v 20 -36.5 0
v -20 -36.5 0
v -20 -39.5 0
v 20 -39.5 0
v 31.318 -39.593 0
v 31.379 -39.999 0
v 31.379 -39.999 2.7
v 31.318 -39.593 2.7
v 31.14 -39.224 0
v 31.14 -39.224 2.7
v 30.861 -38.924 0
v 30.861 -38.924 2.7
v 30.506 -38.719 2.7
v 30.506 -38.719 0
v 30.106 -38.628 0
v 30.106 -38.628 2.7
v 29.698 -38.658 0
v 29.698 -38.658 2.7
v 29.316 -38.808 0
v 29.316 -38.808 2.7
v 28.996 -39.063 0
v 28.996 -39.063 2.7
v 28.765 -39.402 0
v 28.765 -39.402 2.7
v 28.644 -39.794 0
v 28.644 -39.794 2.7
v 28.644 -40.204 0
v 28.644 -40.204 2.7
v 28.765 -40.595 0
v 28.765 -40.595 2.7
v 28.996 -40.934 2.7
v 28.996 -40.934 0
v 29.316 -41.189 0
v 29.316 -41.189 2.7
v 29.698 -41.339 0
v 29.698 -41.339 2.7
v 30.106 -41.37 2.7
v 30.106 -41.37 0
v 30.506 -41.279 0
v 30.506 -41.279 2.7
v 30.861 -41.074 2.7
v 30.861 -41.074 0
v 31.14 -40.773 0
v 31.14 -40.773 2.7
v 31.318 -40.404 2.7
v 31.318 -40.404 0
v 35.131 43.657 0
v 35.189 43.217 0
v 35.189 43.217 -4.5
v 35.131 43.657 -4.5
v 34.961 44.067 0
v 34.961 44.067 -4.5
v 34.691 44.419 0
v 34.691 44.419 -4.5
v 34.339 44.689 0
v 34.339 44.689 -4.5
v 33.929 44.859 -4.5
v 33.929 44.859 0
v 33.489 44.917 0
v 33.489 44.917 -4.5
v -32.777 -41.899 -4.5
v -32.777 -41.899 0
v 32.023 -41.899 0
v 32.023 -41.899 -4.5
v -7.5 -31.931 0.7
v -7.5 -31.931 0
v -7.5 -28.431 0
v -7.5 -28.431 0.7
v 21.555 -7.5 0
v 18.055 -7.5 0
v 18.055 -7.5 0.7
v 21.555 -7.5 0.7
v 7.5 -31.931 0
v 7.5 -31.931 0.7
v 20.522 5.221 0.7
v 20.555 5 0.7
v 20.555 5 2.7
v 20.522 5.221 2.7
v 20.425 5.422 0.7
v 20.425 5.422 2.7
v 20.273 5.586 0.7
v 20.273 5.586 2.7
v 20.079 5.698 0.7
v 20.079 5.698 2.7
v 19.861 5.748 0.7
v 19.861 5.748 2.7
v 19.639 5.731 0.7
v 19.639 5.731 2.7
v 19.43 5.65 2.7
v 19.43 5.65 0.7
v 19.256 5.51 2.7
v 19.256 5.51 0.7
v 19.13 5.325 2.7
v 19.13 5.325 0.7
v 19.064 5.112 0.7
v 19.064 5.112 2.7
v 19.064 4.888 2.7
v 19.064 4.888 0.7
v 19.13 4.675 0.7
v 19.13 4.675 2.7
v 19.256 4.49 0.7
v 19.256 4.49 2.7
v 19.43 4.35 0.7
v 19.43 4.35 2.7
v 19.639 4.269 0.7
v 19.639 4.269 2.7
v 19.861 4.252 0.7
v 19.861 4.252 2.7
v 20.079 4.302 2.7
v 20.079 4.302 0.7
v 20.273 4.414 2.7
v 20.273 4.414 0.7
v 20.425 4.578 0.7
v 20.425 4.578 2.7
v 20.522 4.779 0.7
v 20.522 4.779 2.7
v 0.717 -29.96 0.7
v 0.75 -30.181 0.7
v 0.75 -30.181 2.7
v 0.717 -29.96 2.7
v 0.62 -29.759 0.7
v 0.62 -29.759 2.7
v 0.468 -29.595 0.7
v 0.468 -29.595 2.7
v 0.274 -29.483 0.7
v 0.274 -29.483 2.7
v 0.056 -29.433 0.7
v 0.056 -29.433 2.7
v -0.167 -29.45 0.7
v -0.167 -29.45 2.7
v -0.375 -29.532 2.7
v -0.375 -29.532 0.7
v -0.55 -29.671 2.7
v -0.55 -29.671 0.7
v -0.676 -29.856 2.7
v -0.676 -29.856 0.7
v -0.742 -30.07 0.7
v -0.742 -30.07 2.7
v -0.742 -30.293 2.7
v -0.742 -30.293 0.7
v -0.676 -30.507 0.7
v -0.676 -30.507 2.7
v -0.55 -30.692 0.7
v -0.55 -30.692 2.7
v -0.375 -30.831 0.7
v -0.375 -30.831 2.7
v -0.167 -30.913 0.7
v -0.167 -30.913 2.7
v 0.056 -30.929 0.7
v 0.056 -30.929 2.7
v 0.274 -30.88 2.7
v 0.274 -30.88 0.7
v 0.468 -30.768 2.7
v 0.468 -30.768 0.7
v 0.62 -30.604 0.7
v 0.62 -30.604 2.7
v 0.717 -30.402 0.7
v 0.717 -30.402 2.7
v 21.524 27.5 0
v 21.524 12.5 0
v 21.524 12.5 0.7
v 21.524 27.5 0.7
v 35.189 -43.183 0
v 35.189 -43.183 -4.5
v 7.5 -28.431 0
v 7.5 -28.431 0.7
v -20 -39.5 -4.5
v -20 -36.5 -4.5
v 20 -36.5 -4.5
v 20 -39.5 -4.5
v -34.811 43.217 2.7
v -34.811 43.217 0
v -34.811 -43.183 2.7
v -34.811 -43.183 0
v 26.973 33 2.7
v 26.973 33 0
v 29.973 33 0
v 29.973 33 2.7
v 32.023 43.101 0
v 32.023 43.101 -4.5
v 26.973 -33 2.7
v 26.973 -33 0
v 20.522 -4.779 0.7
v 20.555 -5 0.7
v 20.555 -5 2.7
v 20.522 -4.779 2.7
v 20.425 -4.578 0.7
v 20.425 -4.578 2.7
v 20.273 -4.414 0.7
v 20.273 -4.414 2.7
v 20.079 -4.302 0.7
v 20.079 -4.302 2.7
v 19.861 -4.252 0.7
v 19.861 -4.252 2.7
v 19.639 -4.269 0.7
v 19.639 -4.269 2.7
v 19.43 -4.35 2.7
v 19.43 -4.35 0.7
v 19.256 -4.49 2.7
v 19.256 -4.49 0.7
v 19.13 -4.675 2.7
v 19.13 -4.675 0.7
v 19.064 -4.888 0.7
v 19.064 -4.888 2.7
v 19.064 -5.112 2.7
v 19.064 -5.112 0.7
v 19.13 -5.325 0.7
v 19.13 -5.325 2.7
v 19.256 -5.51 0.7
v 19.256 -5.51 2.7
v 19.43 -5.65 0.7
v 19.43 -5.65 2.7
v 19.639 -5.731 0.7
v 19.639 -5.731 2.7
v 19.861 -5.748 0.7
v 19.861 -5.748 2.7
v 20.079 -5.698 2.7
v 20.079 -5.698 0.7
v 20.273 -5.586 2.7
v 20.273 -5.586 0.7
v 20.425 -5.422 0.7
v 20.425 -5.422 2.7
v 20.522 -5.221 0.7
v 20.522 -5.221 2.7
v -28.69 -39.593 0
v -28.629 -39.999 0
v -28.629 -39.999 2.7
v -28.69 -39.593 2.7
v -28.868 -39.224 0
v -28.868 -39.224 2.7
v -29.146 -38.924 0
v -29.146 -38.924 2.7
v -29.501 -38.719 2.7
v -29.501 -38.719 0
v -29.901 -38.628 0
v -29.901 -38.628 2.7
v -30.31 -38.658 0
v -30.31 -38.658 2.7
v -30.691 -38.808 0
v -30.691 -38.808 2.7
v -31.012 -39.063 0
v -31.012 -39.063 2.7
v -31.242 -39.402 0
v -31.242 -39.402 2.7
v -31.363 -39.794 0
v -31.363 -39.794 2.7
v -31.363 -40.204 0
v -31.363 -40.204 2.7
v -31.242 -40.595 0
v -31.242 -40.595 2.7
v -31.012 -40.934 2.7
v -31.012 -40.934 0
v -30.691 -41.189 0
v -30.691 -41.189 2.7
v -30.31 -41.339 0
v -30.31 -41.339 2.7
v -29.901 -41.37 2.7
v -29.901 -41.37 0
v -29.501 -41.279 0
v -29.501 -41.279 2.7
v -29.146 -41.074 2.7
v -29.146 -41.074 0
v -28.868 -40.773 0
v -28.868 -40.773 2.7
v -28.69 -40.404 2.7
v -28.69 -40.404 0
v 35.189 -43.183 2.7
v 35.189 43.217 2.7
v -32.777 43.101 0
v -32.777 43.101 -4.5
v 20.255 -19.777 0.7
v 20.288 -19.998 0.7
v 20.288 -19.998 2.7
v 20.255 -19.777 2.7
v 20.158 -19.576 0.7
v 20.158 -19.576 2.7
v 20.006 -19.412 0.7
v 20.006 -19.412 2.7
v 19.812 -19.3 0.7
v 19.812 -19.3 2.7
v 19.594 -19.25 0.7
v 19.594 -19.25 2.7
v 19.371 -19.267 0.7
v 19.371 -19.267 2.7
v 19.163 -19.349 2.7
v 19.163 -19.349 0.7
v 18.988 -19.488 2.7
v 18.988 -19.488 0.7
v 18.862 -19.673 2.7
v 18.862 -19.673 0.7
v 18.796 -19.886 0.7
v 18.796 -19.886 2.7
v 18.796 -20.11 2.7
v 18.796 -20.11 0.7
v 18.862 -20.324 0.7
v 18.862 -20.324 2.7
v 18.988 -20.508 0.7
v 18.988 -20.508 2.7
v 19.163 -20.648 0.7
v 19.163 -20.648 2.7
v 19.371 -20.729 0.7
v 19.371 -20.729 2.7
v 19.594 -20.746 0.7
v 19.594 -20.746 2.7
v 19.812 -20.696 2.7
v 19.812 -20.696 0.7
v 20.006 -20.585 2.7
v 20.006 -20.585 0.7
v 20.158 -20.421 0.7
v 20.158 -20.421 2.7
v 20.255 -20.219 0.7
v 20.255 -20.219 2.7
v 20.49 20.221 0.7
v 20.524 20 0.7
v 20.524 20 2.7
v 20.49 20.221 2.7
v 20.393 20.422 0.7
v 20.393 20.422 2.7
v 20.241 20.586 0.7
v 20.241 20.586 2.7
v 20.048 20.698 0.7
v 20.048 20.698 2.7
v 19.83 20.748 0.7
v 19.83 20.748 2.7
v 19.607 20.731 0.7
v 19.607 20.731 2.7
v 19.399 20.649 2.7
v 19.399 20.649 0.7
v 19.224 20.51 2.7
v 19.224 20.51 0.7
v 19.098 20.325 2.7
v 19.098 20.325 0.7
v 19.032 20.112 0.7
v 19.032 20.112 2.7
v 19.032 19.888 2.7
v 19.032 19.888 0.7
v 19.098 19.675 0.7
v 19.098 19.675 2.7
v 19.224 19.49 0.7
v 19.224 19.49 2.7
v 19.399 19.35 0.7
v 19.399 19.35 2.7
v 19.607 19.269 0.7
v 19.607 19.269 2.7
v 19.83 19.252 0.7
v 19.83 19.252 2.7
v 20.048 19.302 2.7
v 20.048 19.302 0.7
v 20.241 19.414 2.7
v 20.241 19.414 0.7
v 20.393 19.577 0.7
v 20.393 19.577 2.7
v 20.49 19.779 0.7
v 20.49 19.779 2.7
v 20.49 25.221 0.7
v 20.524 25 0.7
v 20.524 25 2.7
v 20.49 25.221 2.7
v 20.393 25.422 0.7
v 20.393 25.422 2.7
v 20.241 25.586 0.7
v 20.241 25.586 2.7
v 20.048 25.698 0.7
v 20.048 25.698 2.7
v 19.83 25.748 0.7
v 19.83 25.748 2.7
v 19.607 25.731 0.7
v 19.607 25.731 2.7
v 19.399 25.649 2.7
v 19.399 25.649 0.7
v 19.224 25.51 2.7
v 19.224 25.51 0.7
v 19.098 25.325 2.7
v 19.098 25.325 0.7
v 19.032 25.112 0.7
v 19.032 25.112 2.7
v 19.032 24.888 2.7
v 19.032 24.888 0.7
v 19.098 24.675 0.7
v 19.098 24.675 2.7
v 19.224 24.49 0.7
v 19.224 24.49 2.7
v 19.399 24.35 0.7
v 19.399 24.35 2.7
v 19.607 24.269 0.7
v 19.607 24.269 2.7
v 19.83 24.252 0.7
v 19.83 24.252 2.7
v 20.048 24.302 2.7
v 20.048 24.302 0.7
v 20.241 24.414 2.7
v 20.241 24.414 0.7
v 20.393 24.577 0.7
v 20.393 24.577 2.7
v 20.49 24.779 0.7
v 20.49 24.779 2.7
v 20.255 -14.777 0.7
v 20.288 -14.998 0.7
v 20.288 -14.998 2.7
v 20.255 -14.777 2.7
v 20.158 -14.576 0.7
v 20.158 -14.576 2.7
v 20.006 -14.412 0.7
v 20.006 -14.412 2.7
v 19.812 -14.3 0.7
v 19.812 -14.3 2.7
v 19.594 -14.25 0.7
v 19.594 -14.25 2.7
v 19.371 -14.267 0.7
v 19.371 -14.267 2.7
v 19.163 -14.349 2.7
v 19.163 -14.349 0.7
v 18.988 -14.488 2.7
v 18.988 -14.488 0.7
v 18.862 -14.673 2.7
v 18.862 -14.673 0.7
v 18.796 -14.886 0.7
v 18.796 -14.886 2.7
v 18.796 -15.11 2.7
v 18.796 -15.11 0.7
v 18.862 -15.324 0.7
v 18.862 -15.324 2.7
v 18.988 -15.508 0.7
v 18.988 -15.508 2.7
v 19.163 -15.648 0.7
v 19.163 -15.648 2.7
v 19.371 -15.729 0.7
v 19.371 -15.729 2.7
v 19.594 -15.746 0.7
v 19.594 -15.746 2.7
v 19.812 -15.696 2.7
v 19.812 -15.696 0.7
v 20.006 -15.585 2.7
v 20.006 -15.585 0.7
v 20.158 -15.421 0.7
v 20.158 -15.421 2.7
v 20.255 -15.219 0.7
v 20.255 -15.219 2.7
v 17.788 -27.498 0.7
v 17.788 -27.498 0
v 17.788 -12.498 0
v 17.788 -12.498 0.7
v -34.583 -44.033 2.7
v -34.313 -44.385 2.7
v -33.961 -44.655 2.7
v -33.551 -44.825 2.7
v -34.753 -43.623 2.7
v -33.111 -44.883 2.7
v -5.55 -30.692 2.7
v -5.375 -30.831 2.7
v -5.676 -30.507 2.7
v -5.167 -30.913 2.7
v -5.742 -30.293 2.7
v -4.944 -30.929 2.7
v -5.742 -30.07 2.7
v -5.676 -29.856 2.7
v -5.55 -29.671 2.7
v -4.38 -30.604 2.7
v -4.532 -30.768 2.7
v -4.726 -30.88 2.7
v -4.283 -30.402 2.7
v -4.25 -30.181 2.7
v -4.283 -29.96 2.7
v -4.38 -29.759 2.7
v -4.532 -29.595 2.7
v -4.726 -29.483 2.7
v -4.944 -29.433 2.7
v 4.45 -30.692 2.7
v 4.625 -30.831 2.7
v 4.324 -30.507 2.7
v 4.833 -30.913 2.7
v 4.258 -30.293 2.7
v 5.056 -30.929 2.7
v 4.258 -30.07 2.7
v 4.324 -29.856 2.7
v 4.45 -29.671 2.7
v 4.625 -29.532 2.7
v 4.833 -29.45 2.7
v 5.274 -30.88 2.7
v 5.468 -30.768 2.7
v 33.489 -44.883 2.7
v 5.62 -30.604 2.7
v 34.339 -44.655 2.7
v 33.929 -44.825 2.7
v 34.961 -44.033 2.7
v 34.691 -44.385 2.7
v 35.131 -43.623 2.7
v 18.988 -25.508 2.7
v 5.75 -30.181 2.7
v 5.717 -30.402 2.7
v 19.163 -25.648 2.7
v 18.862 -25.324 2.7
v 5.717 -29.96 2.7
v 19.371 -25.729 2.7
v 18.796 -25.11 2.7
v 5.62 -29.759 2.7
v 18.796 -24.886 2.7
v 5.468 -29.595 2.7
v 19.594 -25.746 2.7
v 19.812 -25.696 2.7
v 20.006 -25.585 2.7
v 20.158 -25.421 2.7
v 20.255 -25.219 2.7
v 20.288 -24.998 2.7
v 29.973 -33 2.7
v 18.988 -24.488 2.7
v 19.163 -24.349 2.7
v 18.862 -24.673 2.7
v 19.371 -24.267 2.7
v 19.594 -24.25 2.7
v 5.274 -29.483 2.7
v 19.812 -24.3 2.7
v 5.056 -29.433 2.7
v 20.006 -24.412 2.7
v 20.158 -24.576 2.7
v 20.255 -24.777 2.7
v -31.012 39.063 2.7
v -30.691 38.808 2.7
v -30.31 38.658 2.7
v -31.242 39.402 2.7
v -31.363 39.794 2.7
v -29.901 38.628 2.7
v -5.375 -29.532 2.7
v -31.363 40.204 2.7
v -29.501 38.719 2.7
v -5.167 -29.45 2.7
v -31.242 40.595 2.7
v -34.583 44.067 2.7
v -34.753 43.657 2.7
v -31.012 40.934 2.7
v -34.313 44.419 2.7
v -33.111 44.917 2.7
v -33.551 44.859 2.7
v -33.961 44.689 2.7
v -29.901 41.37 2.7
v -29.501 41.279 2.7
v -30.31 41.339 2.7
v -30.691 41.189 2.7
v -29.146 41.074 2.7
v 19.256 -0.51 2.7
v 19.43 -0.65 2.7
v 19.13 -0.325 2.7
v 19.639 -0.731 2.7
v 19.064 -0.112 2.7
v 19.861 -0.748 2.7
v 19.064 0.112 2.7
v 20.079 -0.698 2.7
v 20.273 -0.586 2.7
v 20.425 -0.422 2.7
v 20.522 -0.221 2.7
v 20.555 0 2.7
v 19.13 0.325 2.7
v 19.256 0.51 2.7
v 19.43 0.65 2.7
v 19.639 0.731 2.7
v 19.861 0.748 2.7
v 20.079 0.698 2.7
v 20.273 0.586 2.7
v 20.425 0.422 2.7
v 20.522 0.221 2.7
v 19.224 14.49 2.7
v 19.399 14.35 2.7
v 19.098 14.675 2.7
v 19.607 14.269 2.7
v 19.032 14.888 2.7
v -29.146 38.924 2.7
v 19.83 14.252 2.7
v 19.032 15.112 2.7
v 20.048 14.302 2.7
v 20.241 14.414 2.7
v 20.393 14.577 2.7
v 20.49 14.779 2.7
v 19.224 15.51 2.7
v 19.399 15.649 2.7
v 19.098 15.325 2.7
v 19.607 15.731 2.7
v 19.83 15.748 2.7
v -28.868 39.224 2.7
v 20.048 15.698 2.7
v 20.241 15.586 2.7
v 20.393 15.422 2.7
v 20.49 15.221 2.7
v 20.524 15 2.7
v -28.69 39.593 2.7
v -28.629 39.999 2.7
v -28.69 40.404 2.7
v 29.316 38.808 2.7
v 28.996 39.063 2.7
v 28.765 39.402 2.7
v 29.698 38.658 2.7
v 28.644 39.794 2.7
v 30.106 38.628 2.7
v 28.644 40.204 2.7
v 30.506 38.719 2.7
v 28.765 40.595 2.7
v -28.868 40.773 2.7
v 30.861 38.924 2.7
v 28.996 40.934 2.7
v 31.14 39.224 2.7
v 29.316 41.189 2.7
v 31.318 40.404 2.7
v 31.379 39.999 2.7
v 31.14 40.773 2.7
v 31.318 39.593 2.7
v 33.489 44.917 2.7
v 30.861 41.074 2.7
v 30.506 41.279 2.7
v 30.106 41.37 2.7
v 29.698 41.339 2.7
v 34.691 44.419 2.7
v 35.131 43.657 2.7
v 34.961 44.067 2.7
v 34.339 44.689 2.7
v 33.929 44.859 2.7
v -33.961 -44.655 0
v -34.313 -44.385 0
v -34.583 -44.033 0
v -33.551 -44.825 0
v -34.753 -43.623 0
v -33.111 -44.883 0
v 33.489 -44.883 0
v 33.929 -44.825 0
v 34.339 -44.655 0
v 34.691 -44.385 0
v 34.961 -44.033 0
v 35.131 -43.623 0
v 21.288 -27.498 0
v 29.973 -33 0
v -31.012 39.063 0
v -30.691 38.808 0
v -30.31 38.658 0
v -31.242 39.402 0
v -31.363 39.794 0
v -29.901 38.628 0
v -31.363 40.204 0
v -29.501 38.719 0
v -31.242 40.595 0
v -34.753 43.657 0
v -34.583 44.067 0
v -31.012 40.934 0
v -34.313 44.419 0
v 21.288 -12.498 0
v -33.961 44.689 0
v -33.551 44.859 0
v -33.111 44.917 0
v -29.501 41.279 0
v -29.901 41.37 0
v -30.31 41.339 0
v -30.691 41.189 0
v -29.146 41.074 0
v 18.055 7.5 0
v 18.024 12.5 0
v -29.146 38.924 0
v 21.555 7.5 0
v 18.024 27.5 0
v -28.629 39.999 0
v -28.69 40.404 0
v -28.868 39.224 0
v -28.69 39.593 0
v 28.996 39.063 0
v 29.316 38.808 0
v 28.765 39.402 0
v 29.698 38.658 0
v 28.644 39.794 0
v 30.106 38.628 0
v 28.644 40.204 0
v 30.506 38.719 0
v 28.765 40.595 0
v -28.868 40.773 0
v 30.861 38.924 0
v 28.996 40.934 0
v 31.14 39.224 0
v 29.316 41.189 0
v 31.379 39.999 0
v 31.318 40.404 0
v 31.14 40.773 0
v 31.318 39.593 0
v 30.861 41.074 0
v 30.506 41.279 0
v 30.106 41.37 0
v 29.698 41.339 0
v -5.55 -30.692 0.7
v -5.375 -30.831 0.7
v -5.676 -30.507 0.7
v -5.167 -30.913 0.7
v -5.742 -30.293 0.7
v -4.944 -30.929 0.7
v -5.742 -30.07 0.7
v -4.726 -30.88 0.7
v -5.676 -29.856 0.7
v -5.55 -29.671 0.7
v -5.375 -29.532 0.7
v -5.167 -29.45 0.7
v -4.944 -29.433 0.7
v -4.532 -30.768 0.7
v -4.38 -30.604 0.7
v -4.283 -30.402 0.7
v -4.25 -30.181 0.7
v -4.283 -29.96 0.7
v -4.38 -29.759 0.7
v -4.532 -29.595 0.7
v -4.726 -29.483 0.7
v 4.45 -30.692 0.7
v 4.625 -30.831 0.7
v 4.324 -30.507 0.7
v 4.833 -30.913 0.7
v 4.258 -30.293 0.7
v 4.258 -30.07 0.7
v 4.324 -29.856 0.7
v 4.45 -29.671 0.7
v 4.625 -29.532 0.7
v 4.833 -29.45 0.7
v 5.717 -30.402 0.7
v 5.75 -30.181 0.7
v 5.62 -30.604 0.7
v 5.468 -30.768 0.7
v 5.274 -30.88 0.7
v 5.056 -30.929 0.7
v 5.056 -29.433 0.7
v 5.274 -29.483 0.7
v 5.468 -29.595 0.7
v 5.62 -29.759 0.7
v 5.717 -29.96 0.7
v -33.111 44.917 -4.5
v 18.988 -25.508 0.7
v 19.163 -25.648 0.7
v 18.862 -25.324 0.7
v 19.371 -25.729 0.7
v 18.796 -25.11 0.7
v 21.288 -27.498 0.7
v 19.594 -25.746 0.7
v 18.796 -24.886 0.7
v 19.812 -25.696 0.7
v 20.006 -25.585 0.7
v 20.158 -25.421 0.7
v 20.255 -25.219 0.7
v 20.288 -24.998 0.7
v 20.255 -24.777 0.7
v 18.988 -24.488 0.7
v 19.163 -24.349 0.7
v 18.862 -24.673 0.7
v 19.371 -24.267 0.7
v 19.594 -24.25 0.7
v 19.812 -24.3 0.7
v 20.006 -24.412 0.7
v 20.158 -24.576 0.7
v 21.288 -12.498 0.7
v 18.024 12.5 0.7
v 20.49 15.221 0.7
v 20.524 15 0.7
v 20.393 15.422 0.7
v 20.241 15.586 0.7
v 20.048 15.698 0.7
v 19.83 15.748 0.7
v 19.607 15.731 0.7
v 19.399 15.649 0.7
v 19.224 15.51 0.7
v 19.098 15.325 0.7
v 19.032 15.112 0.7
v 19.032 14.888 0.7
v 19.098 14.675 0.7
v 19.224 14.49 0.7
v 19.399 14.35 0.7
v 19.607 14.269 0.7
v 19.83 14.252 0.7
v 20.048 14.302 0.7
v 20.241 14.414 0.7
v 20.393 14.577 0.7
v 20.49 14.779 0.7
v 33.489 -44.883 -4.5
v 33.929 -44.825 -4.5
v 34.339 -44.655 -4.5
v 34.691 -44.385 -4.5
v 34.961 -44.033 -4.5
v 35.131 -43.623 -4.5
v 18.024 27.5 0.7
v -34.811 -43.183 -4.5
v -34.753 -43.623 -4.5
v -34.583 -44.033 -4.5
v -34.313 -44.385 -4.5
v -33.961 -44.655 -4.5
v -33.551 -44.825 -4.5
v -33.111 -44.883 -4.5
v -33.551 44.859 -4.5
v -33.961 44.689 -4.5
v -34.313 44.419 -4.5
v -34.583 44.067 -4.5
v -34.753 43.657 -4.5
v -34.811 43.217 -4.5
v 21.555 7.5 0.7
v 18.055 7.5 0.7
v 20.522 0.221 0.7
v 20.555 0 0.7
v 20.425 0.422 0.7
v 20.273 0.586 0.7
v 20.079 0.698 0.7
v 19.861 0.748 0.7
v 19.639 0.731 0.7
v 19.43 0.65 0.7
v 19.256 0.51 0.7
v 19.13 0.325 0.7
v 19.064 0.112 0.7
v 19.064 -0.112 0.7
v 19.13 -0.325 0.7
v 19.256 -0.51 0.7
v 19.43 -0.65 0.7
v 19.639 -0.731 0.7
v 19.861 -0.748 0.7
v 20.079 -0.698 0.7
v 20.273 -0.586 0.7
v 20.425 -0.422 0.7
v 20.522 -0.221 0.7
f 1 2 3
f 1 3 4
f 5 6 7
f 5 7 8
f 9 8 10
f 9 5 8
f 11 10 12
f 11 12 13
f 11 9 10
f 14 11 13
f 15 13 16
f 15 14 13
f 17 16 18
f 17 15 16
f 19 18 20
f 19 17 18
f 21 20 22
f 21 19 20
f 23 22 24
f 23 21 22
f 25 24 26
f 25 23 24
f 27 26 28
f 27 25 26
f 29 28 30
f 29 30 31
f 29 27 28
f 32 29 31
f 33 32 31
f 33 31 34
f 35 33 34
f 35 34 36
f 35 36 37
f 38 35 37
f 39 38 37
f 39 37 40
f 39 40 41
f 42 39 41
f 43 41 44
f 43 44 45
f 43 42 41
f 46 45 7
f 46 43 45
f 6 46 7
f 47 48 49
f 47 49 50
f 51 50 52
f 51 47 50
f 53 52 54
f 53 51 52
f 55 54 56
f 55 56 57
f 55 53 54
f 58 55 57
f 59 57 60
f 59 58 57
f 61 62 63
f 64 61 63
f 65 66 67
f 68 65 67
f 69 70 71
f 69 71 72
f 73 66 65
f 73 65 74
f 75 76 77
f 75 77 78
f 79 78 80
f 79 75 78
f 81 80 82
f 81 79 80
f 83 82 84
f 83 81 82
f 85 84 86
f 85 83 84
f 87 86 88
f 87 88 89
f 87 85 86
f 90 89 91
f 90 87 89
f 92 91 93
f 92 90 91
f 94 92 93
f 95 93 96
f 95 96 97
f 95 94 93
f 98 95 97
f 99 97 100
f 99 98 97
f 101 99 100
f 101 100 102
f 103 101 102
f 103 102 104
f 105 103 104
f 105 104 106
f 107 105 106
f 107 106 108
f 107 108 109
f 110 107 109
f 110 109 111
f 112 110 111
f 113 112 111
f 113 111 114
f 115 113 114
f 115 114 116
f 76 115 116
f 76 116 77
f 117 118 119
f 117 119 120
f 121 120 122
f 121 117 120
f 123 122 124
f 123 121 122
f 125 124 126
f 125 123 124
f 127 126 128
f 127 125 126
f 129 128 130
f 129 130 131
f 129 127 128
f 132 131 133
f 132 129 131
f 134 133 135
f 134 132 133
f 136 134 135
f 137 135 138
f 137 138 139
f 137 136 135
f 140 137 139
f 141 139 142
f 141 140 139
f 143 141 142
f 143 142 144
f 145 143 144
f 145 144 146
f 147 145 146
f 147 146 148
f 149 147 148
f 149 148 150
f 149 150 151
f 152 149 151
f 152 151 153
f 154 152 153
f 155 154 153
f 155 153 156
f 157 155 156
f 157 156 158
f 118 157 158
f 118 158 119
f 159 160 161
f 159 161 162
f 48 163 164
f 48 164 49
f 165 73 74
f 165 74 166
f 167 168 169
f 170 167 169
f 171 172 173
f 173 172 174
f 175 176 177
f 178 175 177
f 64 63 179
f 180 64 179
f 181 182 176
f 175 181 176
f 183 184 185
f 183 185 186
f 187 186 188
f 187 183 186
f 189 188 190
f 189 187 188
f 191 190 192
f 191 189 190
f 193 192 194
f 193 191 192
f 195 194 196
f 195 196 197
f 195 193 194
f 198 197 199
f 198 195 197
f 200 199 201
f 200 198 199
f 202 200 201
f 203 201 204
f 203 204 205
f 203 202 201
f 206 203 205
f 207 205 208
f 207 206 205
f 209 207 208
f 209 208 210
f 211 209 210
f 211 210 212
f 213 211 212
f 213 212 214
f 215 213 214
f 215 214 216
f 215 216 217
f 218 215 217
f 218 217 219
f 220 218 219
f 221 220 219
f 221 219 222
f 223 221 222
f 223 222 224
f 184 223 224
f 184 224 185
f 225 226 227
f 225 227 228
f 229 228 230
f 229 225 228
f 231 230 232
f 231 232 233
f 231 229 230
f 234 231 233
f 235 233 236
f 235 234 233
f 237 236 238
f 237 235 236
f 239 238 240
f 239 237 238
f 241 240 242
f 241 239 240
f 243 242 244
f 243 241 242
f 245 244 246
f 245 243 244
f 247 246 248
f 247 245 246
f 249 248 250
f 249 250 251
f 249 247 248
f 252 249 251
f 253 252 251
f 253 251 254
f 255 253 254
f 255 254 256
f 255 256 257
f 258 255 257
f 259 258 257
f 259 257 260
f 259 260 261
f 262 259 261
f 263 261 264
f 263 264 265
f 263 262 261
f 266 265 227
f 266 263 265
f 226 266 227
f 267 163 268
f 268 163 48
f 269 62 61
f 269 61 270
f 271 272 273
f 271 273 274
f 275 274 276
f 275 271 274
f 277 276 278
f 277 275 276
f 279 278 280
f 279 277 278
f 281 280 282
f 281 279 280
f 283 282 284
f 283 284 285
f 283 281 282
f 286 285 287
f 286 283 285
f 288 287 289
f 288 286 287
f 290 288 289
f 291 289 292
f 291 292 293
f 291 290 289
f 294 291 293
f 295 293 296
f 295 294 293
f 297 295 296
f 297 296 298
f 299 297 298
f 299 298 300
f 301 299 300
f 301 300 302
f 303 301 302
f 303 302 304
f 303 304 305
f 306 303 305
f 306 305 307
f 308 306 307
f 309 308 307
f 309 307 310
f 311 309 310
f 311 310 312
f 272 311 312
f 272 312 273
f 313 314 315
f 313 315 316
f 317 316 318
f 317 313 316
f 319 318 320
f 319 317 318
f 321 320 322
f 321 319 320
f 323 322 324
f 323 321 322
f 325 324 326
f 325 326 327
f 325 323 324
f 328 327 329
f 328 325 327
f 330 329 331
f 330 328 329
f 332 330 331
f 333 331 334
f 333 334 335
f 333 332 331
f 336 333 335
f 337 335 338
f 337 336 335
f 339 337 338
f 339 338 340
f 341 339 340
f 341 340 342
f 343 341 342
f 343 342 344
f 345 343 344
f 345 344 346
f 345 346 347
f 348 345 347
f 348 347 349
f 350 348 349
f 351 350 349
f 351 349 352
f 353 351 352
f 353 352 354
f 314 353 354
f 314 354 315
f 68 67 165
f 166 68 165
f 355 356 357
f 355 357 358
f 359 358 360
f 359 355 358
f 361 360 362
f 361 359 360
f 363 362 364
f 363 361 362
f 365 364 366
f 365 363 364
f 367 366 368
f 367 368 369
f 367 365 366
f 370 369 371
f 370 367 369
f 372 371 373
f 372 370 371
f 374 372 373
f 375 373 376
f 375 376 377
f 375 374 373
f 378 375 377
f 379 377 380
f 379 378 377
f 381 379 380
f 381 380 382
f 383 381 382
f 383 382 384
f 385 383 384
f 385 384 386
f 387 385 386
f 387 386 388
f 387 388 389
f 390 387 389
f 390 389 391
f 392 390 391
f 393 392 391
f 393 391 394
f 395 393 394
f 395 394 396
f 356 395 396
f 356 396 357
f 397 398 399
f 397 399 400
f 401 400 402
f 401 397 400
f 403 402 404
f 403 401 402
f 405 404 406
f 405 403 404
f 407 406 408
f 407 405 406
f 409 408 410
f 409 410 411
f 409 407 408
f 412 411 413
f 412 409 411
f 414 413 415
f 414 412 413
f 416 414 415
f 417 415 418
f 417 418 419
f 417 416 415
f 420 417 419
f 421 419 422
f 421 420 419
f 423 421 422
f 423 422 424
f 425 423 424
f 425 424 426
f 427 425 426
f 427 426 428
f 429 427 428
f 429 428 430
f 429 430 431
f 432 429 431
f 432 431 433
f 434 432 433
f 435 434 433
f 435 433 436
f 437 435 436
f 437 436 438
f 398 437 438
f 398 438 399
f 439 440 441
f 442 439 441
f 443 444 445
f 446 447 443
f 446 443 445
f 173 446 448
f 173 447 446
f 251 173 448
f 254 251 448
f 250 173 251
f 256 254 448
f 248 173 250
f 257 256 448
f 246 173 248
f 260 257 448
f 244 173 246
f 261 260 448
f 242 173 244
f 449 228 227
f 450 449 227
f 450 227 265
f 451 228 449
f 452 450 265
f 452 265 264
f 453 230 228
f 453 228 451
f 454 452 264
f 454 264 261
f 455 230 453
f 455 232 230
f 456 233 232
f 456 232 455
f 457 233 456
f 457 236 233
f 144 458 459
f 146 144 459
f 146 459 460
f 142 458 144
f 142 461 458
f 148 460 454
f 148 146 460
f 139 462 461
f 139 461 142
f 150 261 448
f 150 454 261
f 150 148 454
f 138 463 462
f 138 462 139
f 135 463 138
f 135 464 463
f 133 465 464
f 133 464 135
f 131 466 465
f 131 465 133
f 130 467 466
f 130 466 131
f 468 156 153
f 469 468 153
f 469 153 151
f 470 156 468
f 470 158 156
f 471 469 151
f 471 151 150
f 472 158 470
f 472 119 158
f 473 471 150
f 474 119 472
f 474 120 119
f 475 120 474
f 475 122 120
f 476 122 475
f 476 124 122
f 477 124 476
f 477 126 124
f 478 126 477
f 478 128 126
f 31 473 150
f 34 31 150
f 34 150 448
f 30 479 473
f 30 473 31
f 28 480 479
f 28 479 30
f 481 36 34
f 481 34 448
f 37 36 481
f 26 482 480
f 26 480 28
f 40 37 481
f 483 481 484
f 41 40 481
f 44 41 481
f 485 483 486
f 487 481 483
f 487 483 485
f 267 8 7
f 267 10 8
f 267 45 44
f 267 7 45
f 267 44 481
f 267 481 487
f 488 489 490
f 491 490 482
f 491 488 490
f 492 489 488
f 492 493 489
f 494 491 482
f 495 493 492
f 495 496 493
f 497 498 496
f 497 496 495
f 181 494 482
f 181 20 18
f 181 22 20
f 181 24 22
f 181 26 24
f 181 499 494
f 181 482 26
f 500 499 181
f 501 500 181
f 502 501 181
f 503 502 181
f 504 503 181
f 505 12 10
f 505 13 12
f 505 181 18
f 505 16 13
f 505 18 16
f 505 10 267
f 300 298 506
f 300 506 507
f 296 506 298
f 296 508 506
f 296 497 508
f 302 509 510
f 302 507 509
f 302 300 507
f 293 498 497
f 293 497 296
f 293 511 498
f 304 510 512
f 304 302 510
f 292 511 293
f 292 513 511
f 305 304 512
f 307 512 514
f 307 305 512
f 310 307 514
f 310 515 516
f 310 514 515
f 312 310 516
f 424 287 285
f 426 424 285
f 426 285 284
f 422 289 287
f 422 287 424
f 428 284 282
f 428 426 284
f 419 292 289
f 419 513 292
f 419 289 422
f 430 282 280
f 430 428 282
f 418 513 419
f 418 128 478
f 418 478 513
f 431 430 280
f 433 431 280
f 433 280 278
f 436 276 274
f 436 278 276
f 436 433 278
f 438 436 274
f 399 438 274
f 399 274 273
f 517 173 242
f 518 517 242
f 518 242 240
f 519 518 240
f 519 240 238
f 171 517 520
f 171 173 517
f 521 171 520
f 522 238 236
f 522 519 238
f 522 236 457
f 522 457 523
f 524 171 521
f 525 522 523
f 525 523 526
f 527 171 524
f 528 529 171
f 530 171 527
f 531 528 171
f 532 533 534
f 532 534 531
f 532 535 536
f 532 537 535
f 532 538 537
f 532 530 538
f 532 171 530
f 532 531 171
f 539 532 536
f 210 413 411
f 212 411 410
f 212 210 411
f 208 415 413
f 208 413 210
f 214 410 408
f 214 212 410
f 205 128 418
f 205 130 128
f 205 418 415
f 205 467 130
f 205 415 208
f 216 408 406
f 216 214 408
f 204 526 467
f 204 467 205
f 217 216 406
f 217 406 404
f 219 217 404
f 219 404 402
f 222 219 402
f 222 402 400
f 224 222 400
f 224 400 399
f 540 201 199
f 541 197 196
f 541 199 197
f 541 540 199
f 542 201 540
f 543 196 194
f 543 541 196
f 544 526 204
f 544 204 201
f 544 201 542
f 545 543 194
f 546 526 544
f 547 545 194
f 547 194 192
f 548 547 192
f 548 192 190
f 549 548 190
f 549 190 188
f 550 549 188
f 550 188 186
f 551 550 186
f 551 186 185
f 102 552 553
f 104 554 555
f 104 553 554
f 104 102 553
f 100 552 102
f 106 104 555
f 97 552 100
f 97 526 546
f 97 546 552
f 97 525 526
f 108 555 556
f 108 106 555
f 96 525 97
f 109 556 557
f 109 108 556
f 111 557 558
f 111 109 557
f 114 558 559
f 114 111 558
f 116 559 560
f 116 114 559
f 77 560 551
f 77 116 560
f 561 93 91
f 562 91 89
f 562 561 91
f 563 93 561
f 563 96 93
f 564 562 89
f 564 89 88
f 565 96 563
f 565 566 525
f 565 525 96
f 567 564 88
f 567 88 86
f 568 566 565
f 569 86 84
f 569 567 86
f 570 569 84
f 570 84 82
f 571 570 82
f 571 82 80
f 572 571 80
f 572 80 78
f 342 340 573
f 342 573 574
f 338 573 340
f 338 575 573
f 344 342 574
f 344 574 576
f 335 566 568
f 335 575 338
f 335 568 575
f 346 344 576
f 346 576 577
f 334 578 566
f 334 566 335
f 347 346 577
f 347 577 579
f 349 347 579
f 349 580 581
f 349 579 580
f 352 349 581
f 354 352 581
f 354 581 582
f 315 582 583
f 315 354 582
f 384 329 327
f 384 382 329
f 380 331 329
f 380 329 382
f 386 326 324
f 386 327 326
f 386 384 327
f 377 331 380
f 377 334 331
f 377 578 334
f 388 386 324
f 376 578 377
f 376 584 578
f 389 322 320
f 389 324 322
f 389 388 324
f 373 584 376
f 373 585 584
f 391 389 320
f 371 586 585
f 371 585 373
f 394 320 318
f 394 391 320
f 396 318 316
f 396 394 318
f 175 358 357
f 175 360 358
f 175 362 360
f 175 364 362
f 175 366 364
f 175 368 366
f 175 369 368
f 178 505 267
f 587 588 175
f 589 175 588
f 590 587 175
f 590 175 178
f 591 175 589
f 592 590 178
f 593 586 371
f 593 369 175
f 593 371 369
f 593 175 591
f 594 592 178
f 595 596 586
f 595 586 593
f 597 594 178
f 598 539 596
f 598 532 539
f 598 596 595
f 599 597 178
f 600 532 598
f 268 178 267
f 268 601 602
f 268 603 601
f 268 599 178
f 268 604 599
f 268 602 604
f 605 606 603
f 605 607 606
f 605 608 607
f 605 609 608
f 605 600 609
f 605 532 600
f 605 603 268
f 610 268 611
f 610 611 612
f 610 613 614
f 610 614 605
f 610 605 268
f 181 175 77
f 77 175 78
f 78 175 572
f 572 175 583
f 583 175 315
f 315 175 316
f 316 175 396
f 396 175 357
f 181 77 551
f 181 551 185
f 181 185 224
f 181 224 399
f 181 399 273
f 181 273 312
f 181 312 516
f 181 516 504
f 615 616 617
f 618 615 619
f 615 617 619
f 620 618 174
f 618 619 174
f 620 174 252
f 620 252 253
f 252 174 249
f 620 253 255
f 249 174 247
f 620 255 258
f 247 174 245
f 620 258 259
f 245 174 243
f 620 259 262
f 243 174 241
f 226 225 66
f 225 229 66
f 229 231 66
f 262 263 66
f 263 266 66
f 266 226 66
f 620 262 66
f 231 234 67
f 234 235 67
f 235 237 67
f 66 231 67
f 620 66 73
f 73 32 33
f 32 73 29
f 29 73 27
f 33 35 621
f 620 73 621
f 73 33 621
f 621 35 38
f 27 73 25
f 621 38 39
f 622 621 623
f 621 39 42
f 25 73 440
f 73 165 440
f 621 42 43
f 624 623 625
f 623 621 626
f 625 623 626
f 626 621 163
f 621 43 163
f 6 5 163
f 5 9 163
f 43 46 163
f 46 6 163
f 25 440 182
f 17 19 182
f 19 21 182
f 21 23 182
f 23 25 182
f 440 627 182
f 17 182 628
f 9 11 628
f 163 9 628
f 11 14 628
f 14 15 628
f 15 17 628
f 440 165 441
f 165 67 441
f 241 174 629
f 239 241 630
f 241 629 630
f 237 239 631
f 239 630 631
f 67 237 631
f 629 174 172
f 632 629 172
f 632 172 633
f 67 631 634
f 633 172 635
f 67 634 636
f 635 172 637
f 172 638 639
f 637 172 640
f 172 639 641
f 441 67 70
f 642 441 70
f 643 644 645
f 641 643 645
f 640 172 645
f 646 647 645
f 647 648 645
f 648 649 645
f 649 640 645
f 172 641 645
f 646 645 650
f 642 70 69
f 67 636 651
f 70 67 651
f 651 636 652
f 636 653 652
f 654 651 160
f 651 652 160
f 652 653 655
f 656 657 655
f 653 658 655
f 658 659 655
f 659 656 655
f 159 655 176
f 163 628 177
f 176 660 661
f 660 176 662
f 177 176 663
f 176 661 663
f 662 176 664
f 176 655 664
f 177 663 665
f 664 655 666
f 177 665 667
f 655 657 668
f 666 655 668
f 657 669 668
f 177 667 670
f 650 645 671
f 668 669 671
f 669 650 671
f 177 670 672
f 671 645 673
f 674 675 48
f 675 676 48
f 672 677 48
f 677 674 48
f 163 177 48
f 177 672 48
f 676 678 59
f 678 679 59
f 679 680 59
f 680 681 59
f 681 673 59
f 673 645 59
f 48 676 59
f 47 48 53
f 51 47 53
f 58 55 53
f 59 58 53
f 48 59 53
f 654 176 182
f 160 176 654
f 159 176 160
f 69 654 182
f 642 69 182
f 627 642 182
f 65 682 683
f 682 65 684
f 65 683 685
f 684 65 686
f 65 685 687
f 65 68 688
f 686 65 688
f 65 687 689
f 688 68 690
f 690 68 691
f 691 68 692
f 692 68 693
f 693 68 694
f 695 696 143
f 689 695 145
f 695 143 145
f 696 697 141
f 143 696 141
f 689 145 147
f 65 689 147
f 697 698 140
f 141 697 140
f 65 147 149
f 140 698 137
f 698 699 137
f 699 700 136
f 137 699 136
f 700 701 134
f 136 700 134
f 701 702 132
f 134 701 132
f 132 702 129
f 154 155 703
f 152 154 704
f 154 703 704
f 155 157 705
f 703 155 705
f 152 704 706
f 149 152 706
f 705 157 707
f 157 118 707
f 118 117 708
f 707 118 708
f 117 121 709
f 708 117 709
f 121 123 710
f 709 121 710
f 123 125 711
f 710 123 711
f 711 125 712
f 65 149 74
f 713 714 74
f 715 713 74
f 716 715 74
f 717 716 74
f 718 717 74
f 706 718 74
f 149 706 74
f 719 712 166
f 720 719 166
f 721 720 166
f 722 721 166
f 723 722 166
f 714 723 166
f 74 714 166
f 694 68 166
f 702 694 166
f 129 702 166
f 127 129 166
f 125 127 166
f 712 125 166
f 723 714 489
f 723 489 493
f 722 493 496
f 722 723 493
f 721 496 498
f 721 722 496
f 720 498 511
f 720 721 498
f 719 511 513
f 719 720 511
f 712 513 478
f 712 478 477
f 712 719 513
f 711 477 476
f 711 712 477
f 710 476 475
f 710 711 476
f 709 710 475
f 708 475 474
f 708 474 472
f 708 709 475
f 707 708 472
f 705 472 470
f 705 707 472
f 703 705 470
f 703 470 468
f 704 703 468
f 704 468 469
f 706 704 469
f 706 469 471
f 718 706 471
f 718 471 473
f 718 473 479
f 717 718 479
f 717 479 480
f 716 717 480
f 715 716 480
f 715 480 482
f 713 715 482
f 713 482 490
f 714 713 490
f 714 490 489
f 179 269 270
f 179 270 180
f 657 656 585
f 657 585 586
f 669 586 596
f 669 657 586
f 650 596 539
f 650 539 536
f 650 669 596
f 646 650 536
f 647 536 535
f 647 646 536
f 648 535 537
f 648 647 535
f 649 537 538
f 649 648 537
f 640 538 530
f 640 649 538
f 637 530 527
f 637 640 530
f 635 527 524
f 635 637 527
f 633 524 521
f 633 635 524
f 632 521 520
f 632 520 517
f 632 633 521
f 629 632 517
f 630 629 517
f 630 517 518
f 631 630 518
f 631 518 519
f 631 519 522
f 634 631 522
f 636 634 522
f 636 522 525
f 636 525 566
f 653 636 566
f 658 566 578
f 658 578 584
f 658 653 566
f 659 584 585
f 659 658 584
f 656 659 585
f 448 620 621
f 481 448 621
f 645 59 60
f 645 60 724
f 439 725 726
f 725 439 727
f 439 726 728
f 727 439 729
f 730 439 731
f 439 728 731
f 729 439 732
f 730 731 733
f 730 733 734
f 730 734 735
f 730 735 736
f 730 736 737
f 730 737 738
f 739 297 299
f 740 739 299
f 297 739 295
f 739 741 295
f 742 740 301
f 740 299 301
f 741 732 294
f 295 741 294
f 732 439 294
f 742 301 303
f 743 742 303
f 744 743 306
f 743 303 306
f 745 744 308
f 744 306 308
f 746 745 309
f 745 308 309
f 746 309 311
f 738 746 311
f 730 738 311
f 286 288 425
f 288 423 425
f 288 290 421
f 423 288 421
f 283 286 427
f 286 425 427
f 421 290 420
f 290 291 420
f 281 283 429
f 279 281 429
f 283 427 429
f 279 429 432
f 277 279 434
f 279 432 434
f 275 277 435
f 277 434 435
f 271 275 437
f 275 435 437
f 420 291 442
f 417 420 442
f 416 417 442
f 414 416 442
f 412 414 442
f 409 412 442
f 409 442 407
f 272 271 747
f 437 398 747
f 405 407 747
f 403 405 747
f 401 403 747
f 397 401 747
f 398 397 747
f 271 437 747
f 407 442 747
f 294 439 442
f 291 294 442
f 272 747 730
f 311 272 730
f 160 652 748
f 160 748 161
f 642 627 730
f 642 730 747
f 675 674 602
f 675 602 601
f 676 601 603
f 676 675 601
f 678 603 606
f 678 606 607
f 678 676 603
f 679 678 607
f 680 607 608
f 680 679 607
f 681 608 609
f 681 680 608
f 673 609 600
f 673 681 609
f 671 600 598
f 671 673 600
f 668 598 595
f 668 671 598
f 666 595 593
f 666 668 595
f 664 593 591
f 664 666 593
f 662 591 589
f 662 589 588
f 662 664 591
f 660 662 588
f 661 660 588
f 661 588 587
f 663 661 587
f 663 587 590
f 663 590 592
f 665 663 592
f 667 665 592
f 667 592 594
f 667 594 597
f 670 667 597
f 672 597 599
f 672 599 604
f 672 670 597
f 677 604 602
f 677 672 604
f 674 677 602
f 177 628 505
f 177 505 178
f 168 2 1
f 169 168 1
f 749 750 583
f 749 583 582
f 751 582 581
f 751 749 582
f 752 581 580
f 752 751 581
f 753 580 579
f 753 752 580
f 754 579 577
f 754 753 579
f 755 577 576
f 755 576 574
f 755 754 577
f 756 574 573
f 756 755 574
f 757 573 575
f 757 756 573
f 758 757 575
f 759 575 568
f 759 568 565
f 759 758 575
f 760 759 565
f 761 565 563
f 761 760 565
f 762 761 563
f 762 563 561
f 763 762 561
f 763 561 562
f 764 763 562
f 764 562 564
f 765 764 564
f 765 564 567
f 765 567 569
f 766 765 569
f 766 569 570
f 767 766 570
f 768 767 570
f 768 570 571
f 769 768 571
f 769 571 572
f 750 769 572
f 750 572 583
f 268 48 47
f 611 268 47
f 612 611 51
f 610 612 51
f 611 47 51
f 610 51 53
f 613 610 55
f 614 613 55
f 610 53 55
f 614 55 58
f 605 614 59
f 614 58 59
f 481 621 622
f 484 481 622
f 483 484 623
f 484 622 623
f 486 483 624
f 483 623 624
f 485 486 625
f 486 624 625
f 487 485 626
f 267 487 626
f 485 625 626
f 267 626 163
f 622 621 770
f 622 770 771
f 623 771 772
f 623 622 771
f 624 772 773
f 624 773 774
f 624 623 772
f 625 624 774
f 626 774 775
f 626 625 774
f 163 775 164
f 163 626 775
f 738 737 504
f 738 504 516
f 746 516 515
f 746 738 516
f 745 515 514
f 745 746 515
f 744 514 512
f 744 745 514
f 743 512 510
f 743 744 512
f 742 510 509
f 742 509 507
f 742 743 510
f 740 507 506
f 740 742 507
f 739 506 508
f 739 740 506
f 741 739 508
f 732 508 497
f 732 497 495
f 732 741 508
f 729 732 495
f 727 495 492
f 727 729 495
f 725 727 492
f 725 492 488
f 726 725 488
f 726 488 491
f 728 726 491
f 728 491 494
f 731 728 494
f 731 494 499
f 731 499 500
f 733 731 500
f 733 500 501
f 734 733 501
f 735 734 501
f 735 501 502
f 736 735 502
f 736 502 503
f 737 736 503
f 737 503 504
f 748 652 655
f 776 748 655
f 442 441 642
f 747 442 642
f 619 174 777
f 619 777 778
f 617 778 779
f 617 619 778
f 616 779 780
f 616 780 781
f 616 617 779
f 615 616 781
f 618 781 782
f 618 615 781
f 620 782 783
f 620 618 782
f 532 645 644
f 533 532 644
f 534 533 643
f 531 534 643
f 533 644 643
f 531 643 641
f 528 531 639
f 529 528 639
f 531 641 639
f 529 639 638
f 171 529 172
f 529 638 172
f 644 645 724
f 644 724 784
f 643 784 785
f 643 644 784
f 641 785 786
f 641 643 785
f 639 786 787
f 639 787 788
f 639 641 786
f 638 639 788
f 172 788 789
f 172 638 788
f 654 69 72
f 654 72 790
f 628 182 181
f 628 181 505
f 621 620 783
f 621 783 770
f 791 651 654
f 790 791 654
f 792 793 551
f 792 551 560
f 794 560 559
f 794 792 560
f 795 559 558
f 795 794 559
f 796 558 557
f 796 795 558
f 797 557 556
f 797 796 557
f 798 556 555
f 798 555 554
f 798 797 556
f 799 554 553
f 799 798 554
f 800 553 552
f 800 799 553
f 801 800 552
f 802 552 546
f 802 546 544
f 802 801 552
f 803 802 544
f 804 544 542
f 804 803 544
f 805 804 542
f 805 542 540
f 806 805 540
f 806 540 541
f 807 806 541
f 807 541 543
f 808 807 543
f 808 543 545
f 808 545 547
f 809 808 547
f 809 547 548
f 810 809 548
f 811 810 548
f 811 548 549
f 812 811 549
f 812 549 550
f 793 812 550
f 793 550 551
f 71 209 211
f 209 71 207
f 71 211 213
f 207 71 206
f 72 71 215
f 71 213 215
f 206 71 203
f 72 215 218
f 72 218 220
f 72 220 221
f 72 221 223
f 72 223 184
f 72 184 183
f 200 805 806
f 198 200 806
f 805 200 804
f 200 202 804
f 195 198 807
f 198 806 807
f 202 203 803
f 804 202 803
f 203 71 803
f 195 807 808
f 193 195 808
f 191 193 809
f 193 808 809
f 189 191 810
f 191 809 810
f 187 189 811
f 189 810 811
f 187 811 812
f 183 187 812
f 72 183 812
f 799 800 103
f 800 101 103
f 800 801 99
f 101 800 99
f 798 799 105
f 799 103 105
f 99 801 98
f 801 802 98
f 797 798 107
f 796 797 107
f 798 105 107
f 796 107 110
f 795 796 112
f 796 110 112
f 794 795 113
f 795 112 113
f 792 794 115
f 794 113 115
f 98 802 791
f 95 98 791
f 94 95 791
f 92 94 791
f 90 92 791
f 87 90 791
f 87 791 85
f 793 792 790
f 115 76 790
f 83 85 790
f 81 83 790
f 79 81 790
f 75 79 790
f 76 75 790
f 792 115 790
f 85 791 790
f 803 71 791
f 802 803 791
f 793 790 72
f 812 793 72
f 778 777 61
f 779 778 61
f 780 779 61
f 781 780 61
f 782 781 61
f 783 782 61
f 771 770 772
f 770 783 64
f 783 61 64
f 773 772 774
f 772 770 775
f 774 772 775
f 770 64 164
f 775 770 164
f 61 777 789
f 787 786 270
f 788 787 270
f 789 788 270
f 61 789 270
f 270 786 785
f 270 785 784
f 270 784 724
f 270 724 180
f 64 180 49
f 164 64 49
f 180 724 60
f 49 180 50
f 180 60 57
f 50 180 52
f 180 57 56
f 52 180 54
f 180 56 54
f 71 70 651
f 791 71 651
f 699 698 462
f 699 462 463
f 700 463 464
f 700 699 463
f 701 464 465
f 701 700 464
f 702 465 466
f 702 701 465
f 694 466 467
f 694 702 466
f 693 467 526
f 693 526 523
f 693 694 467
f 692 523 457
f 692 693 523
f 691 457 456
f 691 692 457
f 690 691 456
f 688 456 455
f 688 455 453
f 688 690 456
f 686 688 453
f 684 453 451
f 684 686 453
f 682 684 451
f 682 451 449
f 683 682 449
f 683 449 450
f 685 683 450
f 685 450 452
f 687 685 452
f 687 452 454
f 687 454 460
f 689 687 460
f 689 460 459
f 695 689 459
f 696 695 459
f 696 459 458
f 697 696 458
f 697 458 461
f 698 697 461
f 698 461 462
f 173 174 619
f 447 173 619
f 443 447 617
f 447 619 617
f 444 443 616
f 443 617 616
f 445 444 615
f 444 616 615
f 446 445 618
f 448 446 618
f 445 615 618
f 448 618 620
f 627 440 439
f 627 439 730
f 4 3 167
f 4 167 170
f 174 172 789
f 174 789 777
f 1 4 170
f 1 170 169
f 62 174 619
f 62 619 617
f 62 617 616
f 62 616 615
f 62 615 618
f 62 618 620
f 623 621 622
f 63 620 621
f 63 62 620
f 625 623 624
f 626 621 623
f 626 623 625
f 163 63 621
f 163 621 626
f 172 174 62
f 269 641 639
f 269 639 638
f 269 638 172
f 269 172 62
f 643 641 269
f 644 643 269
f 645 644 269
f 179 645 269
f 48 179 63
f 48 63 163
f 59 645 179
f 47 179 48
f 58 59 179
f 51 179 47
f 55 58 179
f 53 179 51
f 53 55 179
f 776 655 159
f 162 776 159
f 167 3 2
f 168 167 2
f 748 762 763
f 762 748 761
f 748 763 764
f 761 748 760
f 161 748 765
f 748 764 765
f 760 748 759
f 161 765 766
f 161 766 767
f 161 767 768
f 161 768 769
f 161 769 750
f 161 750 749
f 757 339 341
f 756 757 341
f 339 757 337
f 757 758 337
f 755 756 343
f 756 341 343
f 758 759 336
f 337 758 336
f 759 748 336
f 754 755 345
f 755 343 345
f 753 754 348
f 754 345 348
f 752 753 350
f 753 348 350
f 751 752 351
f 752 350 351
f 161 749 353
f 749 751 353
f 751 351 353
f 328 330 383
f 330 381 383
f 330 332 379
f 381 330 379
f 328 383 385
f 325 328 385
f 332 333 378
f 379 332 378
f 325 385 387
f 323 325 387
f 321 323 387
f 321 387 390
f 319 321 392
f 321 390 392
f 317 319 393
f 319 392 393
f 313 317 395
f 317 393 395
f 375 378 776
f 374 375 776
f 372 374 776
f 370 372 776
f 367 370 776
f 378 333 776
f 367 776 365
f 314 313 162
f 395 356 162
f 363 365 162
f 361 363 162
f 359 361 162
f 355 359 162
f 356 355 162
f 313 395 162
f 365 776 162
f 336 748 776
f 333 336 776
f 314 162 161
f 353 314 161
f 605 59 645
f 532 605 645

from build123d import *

# Parameters (mm, degrees)
F0_W     = 64.8
F0_H     = 85
F0_R     = 1.375
F0_W_2   = 40
F0_H_2   = 3
F0_W_3   = 15
F0_H_3   = 3.5
F0_W_4   = 3.5
F0_H_4   = 15
F0_W_5   = 3
F0_H_5   = 66
F0_R_2   = 0.75
F1_DEPTH = 2.7
F2_DEPTH = 4.5
F3_DEPTH = 0.7


# Not quite as in the source:
# - a feature names something its author has since deleted; it is built from what else it names


with BuildPart() as f1:
    # F0 (on Top) → F1 (new body)
    with BuildSketch(Plane.XY):
        with BuildLine():
            Line((33.489, 44.9169387996), (-33.111, 44.9169387996))
            ThreePointArc((-33.111, 44.9169387996), (-34.313081528, 44.4190203276), (-34.811, 43.2169387996))
            Line((-34.811, 43.2169387996), (-34.811, -43.1830612004))
            ThreePointArc((-34.811, -43.1830612004), (-34.313081528, -44.3851427284), (-33.111, -44.8830612004))
            Line((-33.111, -44.8830612004), (33.489, -44.8830612004))
            ThreePointArc((33.489, -44.8830612004), (34.691081528, -44.3851427284), (35.189, -43.1830612004))
            Line((35.189, -43.1830612004), (35.189, 43.2169387996))
            ThreePointArc((35.189, 43.2169387996), (34.691081528, 44.4190203276), (33.489, 44.9169387996))
        make_face()
        with Locations((-0.377, 0.6012101471)):
            Rectangle(F0_W, F0_H, mode=Mode.SUBTRACT)
        with Locations((-0.377, 0.6012101471)):
            Rectangle(F0_W, F0_H)
        with Locations((-30.0036408007, -39.9986840785)):
            Circle(F0_R, mode=Mode.SUBTRACT)
        with Locations((0, -37.9998721182)):
            Rectangle(F0_W_2, F0_H_2, mode=Mode.SUBTRACT)
        with Locations((0, -30.1813874394)):
            Rectangle(F0_W_3, F0_H_3, mode=Mode.SUBTRACT)
        with Locations((30.0036408007, -39.9986840785)):
            Circle(F0_R, mode=Mode.SUBTRACT)
        with Locations((19.5379477396, -19.9982114275)):
            Rectangle(F0_W_4, F0_H_4, mode=Mode.SUBTRACT)
        with Locations((19.8054168016, 0)):
            Rectangle(F0_W_4, F0_H_4, mode=Mode.SUBTRACT)
        with Locations((28.473, 0)):
            Rectangle(F0_W_5, F0_H_5, mode=Mode.SUBTRACT)
        with Locations((-30.0036408007, 39.9986840785)):
            Circle(F0_R, mode=Mode.SUBTRACT)
        with Locations((19.773574583, 19.9999746518)):
            Rectangle(F0_W_4, F0_H_4, mode=Mode.SUBTRACT)
        with Locations((30.0036408007, 39.9986840785)):
            Circle(F0_R, mode=Mode.SUBTRACT)
        with Locations((0, -37.9998721182)):
            Rectangle(F0_W_2, F0_H_2)
        with Locations((19.8054168016, 0)):
            Rectangle(F0_W_4, F0_H_4)
        with Locations((19.8054168016, -5)):
            Circle(F0_R_2, mode=Mode.SUBTRACT)
        with Locations((19.8054168016, 0)):
            Circle(F0_R_2, mode=Mode.SUBTRACT)
        with Locations((19.8054168016, 5)):
            Circle(F0_R_2, mode=Mode.SUBTRACT)
        with Locations((19.773574583, 19.9999746518)):
            Rectangle(F0_W_4, F0_H_4)
        with Locations((19.773574583, 14.9999746518)):
            Circle(F0_R_2, mode=Mode.SUBTRACT)
        with Locations((19.773574583, 19.9999746518)):
            Circle(F0_R_2, mode=Mode.SUBTRACT)
        with Locations((19.773574583, 24.9999746518)):
            Circle(F0_R_2, mode=Mode.SUBTRACT)
        with Locations((19.5379477396, -19.9982114275)):
            Rectangle(F0_W_4, F0_H_4)
        with Locations((19.5379477396, -24.9982114275)):
            Circle(F0_R_2, mode=Mode.SUBTRACT)
        with Locations((19.5379477396, -19.9982114275)):
            Circle(F0_R_2, mode=Mode.SUBTRACT)
        with Locations((19.5379477396, -14.9982114275)):
            Circle(F0_R_2, mode=Mode.SUBTRACT)
        with Locations((0, -30.1813874394)):
            Rectangle(F0_W_3, F0_H_3)
        with Locations((-5, -30.1813874394)):
            Circle(F0_R_2, mode=Mode.SUBTRACT)
        with Locations((0, -30.1813874394)):
            Circle(F0_R_2, mode=Mode.SUBTRACT)
        with Locations((5, -30.1813874394)):
            Circle(F0_R_2, mode=Mode.SUBTRACT)
    extrude(amount=F1_DEPTH)

    # F0 (on Top) → F3 (cut)
    with BuildSketch(Plane.XY):
        with Locations((0, -30.1813874394)):
            Rectangle(F0_W_3, F0_H_3)
        with Locations((-5, -30.1813874394)):
            Circle(F0_R_2, mode=Mode.SUBTRACT)
        with Locations((0, -30.1813874394)):
            Circle(F0_R_2, mode=Mode.SUBTRACT)
        with Locations((5, -30.1813874394)):
            Circle(F0_R_2, mode=Mode.SUBTRACT)
        with Locations((19.5379477396, -19.9982114275)):
            Rectangle(F0_W_4, F0_H_4)
        with Locations((19.5379477396, -24.9982114275)):
            Circle(F0_R_2, mode=Mode.SUBTRACT)
        with Locations((19.5379477396, -19.9982114275)):
            Circle(F0_R_2, mode=Mode.SUBTRACT)
        with Locations((19.5379477396, -14.9982114275)):
            Circle(F0_R_2, mode=Mode.SUBTRACT)
        with Locations((19.8054168016, 0)):
            Rectangle(F0_W_4, F0_H_4)
        with Locations((19.8054168016, -5)):
            Circle(F0_R_2, mode=Mode.SUBTRACT)
        with Locations((19.8054168016, 0)):
            Circle(F0_R_2, mode=Mode.SUBTRACT)
        with Locations((19.8054168016, 5)):
            Circle(F0_R_2, mode=Mode.SUBTRACT)
        with Locations((19.773574583, 19.9999746518)):
            Rectangle(F0_W_4, F0_H_4)
        with Locations((19.773574583, 14.9999746518)):
            Circle(F0_R_2, mode=Mode.SUBTRACT)
        with Locations((19.773574583, 19.9999746518)):
            Circle(F0_R_2, mode=Mode.SUBTRACT)
        with Locations((19.773574583, 24.9999746518)):
            Circle(F0_R_2, mode=Mode.SUBTRACT)
        with Locations((5, -30.1813874394)):
            Circle(F0_R_2)
        with Locations((19.8054168016, 5)):
            Circle(F0_R_2)
        with Locations((19.8054168016, -5)):
            Circle(F0_R_2)
        with Locations((19.773574583, 14.9999746518)):
            Circle(F0_R_2)
        with Locations((19.773574583, 24.9999746518)):
            Circle(F0_R_2)
        with Locations((19.5379477396, -24.9982114275)):
            Circle(F0_R_2)
        with Locations((19.5379477396, -14.9982114275)):
            Circle(F0_R_2)
        with Locations((19.773574583, 19.9999746518)):
            Circle(F0_R_2)
        with Locations((-5, -30.1813874394)):
            Circle(F0_R_2)
        with Locations((0, -30.1813874394)):
            Circle(F0_R_2)
        with Locations((19.5379477396, -19.9982114275)):
            Circle(F0_R_2)
        with Locations((19.8054168016, 0)):
            Circle(F0_R_2)
    extrude(amount=F3_DEPTH, mode=Mode.SUBTRACT)


with BuildPart() as f2:
    # F0 (on Top) → F2 (new body)
    with BuildSketch(Plane.XY):
        with BuildLine():
            Line((33.489, 44.9169387996), (-33.111, 44.9169387996))
            ThreePointArc((-33.111, 44.9169387996), (-34.313081528, 44.4190203276), (-34.811, 43.2169387996))
            Line((-34.811, 43.2169387996), (-34.811, -43.1830612004))
            ThreePointArc((-34.811, -43.1830612004), (-34.313081528, -44.3851427284), (-33.111, -44.8830612004))
            Line((-33.111, -44.8830612004), (33.489, -44.8830612004))
            ThreePointArc((33.489, -44.8830612004), (34.691081528, -44.3851427284), (35.189, -43.1830612004))
            Line((35.189, -43.1830612004), (35.189, 43.2169387996))
            ThreePointArc((35.189, 43.2169387996), (34.691081528, 44.4190203276), (33.489, 44.9169387996))
        make_face()
        with Locations((-0.377, 0.6012101471)):
            Rectangle(F0_W, F0_H, mode=Mode.SUBTRACT)
    extrude(amount=-F2_DEPTH)


with BuildPart() as f2b:
    # F0 (on Top) → F2, piece 2 (new body)
    with BuildSketch(Plane.XY):
        with Locations((0, -37.9998721182)):
            Rectangle(F0_W_2, F0_H_2)
    extrude(amount=-F2_DEPTH)


solid = Compound([f1.part, f2.part, f2b.part])
